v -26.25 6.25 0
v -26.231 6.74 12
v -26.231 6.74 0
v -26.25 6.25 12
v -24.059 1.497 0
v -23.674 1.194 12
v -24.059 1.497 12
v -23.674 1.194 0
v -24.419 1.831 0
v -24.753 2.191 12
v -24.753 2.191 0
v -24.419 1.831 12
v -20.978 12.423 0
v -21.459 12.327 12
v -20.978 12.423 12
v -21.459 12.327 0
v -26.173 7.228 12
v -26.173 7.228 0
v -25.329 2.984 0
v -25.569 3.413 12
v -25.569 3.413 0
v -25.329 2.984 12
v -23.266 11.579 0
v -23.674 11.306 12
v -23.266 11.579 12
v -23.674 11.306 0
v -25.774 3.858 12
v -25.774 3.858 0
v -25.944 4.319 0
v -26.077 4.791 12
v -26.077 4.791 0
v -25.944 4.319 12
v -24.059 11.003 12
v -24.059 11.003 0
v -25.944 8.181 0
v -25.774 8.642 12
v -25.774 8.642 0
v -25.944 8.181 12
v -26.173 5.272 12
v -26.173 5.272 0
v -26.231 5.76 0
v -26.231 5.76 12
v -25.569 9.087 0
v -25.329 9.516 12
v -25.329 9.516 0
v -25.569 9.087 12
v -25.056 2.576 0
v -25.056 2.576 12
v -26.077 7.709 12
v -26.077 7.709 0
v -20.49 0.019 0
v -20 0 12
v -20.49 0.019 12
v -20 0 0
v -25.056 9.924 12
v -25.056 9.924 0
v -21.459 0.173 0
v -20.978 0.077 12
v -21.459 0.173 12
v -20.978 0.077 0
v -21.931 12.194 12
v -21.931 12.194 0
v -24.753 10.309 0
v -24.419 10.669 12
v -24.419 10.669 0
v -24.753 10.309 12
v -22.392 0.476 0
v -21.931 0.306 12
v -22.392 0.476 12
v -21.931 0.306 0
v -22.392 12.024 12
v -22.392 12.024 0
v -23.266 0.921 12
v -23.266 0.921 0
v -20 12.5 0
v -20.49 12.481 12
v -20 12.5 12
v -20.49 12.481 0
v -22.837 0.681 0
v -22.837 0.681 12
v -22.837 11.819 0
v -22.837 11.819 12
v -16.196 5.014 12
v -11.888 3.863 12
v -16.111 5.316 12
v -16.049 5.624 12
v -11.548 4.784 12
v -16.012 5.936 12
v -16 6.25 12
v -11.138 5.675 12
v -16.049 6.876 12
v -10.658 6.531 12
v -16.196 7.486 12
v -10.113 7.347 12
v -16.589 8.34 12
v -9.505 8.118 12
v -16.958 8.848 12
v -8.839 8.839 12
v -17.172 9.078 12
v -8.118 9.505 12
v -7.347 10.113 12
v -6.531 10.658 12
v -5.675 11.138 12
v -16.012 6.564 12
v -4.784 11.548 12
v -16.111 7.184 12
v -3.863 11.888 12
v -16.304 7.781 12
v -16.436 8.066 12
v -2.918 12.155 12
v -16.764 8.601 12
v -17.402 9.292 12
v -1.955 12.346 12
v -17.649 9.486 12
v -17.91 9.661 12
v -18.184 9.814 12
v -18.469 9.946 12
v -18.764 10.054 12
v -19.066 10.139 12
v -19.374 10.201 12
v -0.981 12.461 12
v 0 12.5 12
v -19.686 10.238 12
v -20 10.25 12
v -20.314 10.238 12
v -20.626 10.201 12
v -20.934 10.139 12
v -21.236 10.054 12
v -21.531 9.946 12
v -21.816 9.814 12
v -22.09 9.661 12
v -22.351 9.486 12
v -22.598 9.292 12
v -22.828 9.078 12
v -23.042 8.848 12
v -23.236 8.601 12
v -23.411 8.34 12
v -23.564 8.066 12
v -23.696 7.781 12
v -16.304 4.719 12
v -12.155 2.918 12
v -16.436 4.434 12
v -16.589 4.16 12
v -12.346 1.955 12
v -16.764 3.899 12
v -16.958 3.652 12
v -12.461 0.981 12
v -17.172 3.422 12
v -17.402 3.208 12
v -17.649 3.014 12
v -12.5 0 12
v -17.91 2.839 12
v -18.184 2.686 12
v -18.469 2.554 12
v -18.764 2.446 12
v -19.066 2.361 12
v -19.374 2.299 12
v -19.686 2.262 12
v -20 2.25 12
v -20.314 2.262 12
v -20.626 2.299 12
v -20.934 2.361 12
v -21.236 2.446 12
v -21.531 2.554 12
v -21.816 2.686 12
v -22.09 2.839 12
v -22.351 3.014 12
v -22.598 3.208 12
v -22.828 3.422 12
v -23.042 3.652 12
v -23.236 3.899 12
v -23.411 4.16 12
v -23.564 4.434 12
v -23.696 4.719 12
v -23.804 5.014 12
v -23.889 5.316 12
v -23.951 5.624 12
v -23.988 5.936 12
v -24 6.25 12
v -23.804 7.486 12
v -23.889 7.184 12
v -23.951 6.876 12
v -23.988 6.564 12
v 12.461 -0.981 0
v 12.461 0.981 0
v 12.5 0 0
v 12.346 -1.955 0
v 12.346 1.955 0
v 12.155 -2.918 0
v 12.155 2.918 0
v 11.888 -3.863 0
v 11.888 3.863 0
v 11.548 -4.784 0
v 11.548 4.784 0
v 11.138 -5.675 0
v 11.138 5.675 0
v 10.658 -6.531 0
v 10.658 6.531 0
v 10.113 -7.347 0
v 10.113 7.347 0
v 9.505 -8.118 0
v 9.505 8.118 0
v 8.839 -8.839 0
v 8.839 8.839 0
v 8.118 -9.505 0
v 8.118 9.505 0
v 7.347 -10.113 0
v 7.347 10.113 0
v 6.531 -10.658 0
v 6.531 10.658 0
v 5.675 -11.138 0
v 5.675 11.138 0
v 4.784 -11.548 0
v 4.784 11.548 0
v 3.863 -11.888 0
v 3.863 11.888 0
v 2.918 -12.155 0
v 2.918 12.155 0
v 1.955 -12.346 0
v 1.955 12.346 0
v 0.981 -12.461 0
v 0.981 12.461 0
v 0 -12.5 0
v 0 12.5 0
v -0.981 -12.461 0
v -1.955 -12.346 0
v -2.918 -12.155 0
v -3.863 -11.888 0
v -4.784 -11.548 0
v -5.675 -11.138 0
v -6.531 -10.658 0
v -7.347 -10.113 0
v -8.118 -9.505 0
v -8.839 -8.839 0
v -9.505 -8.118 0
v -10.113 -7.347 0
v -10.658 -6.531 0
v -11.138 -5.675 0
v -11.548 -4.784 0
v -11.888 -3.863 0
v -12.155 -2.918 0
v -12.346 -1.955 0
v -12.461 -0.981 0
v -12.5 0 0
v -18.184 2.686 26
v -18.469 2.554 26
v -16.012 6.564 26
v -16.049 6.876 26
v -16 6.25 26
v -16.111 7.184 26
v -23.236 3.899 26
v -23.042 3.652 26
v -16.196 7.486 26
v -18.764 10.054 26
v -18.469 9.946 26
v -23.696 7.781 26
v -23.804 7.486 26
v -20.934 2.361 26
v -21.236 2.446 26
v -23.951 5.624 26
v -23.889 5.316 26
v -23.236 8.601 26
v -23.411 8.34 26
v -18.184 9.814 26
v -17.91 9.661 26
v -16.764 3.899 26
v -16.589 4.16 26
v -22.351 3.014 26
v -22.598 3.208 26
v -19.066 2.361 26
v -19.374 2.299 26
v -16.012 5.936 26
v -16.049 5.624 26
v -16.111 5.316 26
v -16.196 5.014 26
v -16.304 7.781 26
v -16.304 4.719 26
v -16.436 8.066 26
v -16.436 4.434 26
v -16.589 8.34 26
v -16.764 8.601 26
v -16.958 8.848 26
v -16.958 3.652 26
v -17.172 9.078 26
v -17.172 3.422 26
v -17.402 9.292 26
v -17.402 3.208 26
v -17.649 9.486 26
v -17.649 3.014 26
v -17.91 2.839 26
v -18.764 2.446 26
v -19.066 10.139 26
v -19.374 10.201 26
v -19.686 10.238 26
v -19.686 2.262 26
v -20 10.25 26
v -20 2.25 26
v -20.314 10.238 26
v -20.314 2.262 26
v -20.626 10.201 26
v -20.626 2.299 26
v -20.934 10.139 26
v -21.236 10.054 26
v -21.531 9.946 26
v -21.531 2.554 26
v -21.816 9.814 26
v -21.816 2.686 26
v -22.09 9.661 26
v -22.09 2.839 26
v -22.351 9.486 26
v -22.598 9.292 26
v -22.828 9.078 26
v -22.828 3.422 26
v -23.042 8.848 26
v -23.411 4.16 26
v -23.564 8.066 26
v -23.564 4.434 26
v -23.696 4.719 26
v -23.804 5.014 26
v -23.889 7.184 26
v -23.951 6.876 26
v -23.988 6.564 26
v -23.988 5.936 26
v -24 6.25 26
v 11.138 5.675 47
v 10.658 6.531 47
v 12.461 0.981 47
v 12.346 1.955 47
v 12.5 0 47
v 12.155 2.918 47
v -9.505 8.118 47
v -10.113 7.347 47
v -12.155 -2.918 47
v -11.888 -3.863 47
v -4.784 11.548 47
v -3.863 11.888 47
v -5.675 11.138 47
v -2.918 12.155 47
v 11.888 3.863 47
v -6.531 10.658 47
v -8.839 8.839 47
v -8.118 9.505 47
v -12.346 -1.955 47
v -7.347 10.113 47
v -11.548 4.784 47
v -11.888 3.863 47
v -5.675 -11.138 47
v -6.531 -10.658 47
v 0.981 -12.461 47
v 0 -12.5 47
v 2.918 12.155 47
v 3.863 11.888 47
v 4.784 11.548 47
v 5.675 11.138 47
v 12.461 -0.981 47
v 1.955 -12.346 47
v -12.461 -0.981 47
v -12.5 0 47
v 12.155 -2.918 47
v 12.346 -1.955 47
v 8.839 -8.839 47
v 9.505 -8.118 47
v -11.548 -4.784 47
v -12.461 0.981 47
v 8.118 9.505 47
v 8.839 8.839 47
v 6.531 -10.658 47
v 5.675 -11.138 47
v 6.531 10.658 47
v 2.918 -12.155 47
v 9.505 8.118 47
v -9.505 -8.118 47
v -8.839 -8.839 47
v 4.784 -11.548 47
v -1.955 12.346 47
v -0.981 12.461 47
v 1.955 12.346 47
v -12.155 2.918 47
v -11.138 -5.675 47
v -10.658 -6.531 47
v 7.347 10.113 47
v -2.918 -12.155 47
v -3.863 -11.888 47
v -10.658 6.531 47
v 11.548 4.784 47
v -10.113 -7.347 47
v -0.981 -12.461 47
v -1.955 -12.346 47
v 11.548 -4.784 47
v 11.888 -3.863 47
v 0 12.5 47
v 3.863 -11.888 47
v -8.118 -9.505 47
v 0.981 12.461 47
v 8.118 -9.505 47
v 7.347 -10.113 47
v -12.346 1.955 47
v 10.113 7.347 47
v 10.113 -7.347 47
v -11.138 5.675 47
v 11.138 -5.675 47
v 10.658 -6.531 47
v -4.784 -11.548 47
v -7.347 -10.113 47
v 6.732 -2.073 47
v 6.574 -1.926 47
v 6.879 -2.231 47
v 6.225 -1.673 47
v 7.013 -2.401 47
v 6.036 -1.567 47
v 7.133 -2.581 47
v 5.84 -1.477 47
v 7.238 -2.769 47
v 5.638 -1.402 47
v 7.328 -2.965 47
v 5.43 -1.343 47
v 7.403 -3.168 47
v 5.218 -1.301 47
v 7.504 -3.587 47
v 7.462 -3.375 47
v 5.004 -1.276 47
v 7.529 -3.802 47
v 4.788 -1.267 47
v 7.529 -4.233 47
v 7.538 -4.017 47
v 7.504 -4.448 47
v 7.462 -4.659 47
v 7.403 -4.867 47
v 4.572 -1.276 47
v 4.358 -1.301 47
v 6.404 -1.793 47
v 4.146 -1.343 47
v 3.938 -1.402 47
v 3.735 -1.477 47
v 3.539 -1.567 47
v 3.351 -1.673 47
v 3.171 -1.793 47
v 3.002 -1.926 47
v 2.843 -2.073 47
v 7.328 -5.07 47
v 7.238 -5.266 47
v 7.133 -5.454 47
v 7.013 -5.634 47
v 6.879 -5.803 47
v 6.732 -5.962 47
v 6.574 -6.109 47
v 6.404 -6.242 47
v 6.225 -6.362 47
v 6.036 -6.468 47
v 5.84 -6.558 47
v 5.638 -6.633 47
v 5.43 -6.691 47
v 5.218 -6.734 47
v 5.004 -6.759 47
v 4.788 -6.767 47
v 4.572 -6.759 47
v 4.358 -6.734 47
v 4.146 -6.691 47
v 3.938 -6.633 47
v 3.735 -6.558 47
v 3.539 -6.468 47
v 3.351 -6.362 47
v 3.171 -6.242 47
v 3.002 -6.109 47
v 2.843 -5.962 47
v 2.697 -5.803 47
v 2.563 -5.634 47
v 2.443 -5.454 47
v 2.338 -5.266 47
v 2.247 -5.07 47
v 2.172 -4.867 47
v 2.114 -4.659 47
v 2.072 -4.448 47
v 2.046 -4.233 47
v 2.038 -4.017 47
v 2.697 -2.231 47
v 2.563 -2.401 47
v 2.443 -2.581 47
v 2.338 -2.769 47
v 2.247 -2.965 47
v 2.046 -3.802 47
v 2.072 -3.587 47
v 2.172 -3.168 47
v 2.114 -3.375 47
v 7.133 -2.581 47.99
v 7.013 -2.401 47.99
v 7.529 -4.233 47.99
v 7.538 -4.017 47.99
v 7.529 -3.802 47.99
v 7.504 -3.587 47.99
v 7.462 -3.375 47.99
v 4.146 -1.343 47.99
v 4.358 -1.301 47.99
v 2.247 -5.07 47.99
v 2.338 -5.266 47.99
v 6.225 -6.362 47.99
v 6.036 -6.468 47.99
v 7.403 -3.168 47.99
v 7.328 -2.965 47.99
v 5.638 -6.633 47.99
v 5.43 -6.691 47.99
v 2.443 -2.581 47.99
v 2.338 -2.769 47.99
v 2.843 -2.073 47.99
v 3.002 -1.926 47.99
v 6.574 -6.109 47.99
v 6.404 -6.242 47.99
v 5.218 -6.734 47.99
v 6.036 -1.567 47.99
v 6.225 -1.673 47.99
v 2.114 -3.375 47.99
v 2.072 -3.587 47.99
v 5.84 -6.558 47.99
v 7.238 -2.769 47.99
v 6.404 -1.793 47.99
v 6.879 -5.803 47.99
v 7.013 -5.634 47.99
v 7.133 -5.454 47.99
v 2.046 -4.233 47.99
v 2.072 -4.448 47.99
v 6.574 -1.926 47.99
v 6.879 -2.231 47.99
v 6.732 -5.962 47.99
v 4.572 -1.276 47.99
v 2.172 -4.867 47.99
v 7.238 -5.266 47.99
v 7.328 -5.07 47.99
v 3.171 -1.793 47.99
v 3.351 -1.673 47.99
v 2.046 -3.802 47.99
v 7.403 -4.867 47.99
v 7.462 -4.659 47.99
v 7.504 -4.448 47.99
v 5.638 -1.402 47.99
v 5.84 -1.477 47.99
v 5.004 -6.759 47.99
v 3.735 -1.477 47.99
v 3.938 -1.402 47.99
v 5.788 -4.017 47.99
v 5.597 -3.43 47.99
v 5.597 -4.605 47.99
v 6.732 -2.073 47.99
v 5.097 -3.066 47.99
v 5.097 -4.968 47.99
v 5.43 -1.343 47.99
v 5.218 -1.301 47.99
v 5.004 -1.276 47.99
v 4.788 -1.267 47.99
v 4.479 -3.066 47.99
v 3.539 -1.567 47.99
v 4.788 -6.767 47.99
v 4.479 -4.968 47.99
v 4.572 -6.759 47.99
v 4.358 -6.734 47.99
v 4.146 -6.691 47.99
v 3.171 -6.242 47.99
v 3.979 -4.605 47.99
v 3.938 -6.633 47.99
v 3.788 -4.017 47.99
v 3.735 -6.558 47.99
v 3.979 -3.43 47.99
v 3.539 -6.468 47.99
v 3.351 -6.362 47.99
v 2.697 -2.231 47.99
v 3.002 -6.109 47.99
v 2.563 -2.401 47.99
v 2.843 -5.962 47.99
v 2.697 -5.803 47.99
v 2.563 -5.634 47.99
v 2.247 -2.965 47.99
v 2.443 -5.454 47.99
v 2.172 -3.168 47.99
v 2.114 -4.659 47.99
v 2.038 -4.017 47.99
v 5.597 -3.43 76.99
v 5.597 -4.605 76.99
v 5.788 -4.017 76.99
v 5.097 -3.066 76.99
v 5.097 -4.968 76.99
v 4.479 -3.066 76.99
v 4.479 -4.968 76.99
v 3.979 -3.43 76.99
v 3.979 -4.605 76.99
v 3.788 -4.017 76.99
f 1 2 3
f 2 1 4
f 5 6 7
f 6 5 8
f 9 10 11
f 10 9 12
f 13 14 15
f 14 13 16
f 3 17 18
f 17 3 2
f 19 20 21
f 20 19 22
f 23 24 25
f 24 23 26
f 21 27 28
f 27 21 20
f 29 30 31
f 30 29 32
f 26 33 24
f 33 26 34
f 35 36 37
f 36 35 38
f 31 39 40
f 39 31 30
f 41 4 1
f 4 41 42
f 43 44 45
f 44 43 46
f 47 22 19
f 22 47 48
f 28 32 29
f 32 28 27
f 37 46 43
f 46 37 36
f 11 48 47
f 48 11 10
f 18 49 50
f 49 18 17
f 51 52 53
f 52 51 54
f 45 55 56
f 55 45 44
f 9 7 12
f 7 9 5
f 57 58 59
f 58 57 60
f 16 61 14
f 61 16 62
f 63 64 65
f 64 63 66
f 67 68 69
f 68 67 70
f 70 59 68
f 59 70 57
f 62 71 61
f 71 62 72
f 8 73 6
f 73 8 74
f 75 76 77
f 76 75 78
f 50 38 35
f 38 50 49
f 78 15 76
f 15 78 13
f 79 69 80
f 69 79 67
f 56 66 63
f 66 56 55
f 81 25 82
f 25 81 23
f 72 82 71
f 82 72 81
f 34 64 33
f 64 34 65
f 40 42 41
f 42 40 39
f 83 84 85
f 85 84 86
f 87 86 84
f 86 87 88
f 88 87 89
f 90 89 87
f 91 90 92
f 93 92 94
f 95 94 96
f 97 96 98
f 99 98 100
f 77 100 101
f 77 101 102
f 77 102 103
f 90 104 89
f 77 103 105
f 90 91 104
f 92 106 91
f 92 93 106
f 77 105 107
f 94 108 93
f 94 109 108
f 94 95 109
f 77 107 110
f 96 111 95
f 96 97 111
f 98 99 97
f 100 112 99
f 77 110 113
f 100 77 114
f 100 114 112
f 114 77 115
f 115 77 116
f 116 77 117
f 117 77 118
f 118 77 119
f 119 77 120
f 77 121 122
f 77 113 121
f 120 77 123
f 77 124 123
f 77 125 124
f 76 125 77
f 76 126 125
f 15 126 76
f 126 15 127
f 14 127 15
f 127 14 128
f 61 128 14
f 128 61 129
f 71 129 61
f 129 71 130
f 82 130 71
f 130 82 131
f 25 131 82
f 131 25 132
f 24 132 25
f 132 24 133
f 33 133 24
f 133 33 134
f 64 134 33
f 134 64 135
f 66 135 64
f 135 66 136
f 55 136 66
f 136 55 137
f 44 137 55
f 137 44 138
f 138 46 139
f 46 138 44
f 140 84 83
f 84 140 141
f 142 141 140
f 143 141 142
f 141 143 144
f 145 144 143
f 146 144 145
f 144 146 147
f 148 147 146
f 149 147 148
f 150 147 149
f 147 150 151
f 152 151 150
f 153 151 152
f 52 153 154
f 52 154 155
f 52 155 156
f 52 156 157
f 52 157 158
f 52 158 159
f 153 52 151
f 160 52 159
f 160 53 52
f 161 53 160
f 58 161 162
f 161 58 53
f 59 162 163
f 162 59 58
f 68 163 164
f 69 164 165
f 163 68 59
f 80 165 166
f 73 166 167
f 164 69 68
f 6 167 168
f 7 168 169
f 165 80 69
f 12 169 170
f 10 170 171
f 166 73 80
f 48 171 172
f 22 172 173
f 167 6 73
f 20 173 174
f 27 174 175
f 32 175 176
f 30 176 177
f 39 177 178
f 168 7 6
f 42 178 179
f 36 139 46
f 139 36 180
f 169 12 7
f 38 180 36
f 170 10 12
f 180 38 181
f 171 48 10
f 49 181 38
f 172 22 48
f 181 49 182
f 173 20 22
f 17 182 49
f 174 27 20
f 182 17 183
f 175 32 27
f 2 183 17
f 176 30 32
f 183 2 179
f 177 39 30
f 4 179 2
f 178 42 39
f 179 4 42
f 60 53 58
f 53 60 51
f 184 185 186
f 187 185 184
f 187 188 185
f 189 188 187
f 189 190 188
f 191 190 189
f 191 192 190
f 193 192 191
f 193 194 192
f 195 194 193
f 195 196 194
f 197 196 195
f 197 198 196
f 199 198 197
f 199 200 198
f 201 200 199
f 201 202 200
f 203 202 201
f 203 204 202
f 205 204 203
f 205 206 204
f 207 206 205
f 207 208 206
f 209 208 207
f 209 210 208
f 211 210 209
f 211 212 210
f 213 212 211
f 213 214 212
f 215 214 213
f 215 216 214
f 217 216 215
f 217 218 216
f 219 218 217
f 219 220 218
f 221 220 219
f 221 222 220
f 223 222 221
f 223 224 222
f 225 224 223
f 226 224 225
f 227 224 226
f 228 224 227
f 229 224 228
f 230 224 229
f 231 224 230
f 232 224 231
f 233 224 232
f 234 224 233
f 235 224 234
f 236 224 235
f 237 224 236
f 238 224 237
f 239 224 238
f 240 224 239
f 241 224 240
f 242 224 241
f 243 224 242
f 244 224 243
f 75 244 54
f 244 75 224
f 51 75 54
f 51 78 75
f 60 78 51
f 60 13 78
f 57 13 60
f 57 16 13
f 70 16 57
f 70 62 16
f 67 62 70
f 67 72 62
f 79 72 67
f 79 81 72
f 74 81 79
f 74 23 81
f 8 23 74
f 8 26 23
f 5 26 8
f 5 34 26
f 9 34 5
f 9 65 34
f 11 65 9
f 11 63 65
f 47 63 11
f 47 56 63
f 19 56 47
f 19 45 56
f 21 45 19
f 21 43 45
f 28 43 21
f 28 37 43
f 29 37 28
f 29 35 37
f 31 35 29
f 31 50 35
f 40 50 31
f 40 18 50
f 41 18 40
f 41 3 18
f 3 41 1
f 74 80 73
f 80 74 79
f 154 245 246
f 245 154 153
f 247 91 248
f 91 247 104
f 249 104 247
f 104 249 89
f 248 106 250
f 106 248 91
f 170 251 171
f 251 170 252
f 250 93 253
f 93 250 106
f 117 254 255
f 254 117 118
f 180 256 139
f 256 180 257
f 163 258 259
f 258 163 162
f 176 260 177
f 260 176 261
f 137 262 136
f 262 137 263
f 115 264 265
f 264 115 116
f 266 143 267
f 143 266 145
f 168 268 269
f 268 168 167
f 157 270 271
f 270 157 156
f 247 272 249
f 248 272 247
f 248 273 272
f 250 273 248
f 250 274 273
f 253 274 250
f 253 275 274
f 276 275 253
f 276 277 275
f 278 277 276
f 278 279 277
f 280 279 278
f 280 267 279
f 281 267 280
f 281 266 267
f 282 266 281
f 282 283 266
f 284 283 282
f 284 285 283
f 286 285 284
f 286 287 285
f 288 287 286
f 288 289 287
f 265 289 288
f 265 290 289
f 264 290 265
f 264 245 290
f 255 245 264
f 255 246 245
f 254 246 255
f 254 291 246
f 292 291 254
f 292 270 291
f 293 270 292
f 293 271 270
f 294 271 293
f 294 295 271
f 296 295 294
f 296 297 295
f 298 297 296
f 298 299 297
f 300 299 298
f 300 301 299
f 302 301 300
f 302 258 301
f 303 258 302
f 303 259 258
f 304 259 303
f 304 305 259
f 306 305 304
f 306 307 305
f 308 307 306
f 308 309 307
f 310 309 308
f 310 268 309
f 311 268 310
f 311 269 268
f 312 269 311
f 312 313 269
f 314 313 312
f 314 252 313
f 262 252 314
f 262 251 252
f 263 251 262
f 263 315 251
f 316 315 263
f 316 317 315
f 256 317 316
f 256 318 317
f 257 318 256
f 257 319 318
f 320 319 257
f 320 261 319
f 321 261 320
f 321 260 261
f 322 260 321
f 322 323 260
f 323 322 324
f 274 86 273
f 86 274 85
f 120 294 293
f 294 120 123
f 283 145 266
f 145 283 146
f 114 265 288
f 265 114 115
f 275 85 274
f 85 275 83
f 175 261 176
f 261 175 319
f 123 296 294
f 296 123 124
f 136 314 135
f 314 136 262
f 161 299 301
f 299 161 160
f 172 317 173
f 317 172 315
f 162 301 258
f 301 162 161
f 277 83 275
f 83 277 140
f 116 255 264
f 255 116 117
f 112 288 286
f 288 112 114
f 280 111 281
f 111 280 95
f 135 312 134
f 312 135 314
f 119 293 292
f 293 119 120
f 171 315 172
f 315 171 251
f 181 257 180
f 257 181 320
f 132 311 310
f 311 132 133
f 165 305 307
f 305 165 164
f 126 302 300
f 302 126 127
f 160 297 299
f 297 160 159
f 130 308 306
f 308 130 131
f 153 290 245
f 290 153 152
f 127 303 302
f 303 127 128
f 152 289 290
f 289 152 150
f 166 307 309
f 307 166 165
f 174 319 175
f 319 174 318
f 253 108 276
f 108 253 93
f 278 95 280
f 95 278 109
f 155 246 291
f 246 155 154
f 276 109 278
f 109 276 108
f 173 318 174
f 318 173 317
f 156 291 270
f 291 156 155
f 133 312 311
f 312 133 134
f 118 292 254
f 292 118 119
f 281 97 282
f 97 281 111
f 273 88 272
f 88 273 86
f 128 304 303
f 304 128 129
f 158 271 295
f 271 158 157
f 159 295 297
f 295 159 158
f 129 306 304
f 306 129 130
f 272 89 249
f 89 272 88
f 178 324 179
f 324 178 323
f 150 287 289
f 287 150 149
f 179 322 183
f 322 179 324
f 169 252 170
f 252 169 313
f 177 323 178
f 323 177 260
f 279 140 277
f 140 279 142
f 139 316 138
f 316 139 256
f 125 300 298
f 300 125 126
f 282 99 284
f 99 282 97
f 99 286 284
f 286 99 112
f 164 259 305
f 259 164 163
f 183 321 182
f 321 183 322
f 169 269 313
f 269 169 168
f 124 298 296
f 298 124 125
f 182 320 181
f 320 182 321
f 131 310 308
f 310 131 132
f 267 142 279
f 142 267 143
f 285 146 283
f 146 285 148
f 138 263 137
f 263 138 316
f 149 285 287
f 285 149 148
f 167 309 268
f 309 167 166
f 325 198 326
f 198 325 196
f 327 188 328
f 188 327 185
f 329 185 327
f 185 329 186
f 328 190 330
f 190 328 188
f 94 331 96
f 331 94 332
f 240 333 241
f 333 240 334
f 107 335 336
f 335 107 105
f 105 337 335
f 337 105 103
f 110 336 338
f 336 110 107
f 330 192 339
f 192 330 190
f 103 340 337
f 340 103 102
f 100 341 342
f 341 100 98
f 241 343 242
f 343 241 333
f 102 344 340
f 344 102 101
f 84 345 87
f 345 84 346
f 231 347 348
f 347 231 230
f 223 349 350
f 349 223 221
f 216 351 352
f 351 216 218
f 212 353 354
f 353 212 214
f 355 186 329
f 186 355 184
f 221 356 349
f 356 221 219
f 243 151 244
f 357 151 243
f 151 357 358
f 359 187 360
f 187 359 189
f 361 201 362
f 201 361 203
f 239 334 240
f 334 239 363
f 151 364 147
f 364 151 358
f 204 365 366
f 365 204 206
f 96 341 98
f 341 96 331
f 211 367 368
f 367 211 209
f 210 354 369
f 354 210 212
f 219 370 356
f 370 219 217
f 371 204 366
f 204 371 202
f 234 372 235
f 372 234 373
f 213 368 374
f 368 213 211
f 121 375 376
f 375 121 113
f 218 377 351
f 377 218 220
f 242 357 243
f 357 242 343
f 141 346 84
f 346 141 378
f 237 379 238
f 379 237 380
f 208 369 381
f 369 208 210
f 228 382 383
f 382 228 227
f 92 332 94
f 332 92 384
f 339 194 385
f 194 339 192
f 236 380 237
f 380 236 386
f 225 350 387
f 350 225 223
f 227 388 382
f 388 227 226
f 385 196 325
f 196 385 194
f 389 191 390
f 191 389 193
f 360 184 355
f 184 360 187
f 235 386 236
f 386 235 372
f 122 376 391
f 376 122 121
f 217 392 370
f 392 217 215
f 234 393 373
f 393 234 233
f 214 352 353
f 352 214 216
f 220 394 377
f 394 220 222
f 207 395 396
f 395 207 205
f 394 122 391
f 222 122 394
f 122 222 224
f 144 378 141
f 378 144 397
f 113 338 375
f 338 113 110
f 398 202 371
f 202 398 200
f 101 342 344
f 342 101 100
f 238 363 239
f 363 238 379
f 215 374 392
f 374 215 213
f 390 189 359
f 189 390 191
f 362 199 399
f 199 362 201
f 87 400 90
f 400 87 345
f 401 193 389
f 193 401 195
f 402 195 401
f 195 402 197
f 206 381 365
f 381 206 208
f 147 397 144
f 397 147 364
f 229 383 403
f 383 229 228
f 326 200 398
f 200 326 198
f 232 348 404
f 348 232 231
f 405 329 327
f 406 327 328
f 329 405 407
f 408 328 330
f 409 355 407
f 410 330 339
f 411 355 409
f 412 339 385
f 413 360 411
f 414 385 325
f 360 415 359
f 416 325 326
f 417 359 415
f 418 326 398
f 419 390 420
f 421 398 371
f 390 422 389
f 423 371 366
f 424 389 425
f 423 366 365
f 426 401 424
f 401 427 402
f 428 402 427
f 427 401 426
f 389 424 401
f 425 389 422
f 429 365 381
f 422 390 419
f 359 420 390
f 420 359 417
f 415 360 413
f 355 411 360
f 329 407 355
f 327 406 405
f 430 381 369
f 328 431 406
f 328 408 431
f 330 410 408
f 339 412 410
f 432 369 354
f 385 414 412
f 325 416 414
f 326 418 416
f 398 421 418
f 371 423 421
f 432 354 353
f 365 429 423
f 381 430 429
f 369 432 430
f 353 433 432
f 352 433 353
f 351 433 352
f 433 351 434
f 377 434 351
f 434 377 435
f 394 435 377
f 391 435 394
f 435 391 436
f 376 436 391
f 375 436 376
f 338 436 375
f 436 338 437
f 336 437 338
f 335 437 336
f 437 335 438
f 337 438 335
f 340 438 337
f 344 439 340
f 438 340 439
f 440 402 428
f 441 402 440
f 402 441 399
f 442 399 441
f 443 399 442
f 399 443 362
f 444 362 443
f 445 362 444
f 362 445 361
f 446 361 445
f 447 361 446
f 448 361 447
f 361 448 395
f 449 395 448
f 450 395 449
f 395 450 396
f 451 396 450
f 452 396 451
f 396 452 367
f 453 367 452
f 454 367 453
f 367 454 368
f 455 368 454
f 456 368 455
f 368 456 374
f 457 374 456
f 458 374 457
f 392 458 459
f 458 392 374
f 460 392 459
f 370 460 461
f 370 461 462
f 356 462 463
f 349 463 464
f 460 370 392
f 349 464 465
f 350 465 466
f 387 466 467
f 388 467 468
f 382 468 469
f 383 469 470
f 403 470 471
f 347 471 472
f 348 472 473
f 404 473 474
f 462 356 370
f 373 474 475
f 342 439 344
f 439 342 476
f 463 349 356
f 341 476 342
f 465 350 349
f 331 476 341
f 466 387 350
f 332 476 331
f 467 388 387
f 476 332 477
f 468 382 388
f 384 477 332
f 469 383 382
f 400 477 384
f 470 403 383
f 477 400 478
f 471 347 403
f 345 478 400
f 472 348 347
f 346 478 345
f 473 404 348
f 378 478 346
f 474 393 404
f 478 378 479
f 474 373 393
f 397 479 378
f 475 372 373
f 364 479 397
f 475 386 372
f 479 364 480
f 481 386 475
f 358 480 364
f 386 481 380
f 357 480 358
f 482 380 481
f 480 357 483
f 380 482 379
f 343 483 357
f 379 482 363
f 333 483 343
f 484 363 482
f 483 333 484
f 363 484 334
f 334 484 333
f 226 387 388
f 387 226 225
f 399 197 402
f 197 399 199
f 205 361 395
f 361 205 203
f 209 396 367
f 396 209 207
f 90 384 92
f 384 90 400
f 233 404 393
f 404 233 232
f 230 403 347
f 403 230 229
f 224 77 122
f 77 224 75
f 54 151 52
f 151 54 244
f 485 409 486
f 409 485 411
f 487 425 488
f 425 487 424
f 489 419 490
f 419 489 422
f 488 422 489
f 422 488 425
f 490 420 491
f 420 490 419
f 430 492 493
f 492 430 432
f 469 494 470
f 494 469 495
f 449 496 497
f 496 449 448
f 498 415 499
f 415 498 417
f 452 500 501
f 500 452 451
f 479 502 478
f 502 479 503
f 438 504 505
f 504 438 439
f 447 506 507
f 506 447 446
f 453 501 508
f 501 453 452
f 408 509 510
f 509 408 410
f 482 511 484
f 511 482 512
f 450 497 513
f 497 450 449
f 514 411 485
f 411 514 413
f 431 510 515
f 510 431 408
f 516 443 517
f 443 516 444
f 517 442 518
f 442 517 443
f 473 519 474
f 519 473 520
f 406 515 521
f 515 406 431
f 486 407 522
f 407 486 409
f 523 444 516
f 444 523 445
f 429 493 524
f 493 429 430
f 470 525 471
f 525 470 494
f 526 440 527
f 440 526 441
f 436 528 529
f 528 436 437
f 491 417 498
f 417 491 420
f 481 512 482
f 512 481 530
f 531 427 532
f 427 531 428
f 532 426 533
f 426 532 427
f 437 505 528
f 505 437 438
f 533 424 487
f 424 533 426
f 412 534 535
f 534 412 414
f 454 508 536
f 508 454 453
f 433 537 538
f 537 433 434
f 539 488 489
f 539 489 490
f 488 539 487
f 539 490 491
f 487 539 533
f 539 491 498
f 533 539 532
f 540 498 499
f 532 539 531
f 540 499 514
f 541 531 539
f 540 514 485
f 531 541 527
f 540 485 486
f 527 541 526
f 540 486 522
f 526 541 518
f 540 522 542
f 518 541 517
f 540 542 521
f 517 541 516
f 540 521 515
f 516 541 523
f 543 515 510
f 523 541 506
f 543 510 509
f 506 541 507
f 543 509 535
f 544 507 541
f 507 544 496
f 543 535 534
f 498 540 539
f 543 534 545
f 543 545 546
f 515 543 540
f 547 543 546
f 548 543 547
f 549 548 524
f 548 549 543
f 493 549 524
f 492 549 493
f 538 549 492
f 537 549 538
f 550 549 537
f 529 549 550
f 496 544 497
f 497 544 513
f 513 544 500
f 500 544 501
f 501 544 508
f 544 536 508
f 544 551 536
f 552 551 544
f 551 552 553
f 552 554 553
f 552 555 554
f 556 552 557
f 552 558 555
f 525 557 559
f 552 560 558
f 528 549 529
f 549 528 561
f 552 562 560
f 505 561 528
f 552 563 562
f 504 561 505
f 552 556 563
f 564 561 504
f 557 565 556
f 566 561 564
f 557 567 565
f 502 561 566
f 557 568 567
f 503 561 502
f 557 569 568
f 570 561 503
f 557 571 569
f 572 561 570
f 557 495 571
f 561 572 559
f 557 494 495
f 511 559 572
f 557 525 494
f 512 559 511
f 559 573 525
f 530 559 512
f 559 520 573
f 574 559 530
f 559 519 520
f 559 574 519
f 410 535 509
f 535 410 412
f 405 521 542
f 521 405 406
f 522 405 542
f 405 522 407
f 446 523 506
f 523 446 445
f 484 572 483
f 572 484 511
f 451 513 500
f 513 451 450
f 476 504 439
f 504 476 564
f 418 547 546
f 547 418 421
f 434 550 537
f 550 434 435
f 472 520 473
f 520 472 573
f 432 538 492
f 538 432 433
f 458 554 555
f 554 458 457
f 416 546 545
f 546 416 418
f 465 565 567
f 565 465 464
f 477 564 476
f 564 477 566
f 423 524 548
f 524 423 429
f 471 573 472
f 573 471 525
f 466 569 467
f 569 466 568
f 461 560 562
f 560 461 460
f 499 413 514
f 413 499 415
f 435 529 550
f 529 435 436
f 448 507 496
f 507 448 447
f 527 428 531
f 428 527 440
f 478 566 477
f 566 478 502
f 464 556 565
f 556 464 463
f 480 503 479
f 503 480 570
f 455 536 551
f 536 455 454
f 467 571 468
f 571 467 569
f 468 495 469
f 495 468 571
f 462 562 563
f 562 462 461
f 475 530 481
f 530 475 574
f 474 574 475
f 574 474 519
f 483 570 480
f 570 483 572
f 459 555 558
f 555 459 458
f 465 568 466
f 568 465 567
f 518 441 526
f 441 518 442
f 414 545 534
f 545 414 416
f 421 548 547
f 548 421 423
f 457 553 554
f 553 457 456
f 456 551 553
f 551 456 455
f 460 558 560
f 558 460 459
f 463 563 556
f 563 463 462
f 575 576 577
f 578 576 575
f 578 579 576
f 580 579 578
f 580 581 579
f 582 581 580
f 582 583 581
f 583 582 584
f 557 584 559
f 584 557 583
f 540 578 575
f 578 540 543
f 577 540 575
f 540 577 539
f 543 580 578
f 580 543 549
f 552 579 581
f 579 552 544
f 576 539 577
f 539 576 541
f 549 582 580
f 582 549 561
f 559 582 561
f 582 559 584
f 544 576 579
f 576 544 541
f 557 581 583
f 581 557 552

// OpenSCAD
// file: vertical_pump.scad
// Copyright (c) 2026 Chris Lee and contributors.
// Licensed under the MIT license. See LICENSE file in the project root for details.

include <MCAD/units.scad>
//include <ProjectBox/rounded_box.scad>

pump_diameter = 25;
pump_diameter2 = 12.5;
pump_height = 47;

pump_cyl_sep =  [-20,  pump_diameter/2 - pump_diameter2/2, 0];
pump_cyl_sep1 = [-20, -pump_diameter/2 + pump_diameter2/2, 0];
pump_wire_bump_diameter = 5.5;
pump_wire_angle = 320;
pump_wire_offset_d = pump_diameter/4;
pump_wire_offset = [pump_wire_offset_d*cos(pump_wire_angle),
		    pump_wire_offset_d*sin(pump_wire_angle),
		    pump_height-epsilon];

module VerticalPump() {
  $fn = 80;

  cyl2_height = 26;
  cyl2_diameter = 8;

  color("white") {
    cylinder(pump_height, pump_diameter/2, pump_diameter/2);
    translate(pump_cyl_sep) {
      cylinder(12, pump_diameter2/2, pump_diameter2/2);
      cylinder(cyl2_height, cyl2_diameter/2, cyl2_diameter/2);
    }
    translate(pump_cyl_sep - Y*pump_diameter2/2) {
      cube([-pump_cyl_sep[0], pump_diameter2, 12]);
    }
    translate(pump_wire_offset) {
      cylinder(1, pump_wire_bump_diameter/2, pump_wire_bump_diameter/2);
    }
  }
  translate(pump_wire_offset) {
    color("black") cylinder(30, 1, 1, $fn=10);
  }
}
// main file
// Copyright (c) 2026 Chris Lee and contributors.
// Licensed under the MIT license. See LICENSE file in the project root for details.

include <vertical_pump.scad>

VerticalPump();
